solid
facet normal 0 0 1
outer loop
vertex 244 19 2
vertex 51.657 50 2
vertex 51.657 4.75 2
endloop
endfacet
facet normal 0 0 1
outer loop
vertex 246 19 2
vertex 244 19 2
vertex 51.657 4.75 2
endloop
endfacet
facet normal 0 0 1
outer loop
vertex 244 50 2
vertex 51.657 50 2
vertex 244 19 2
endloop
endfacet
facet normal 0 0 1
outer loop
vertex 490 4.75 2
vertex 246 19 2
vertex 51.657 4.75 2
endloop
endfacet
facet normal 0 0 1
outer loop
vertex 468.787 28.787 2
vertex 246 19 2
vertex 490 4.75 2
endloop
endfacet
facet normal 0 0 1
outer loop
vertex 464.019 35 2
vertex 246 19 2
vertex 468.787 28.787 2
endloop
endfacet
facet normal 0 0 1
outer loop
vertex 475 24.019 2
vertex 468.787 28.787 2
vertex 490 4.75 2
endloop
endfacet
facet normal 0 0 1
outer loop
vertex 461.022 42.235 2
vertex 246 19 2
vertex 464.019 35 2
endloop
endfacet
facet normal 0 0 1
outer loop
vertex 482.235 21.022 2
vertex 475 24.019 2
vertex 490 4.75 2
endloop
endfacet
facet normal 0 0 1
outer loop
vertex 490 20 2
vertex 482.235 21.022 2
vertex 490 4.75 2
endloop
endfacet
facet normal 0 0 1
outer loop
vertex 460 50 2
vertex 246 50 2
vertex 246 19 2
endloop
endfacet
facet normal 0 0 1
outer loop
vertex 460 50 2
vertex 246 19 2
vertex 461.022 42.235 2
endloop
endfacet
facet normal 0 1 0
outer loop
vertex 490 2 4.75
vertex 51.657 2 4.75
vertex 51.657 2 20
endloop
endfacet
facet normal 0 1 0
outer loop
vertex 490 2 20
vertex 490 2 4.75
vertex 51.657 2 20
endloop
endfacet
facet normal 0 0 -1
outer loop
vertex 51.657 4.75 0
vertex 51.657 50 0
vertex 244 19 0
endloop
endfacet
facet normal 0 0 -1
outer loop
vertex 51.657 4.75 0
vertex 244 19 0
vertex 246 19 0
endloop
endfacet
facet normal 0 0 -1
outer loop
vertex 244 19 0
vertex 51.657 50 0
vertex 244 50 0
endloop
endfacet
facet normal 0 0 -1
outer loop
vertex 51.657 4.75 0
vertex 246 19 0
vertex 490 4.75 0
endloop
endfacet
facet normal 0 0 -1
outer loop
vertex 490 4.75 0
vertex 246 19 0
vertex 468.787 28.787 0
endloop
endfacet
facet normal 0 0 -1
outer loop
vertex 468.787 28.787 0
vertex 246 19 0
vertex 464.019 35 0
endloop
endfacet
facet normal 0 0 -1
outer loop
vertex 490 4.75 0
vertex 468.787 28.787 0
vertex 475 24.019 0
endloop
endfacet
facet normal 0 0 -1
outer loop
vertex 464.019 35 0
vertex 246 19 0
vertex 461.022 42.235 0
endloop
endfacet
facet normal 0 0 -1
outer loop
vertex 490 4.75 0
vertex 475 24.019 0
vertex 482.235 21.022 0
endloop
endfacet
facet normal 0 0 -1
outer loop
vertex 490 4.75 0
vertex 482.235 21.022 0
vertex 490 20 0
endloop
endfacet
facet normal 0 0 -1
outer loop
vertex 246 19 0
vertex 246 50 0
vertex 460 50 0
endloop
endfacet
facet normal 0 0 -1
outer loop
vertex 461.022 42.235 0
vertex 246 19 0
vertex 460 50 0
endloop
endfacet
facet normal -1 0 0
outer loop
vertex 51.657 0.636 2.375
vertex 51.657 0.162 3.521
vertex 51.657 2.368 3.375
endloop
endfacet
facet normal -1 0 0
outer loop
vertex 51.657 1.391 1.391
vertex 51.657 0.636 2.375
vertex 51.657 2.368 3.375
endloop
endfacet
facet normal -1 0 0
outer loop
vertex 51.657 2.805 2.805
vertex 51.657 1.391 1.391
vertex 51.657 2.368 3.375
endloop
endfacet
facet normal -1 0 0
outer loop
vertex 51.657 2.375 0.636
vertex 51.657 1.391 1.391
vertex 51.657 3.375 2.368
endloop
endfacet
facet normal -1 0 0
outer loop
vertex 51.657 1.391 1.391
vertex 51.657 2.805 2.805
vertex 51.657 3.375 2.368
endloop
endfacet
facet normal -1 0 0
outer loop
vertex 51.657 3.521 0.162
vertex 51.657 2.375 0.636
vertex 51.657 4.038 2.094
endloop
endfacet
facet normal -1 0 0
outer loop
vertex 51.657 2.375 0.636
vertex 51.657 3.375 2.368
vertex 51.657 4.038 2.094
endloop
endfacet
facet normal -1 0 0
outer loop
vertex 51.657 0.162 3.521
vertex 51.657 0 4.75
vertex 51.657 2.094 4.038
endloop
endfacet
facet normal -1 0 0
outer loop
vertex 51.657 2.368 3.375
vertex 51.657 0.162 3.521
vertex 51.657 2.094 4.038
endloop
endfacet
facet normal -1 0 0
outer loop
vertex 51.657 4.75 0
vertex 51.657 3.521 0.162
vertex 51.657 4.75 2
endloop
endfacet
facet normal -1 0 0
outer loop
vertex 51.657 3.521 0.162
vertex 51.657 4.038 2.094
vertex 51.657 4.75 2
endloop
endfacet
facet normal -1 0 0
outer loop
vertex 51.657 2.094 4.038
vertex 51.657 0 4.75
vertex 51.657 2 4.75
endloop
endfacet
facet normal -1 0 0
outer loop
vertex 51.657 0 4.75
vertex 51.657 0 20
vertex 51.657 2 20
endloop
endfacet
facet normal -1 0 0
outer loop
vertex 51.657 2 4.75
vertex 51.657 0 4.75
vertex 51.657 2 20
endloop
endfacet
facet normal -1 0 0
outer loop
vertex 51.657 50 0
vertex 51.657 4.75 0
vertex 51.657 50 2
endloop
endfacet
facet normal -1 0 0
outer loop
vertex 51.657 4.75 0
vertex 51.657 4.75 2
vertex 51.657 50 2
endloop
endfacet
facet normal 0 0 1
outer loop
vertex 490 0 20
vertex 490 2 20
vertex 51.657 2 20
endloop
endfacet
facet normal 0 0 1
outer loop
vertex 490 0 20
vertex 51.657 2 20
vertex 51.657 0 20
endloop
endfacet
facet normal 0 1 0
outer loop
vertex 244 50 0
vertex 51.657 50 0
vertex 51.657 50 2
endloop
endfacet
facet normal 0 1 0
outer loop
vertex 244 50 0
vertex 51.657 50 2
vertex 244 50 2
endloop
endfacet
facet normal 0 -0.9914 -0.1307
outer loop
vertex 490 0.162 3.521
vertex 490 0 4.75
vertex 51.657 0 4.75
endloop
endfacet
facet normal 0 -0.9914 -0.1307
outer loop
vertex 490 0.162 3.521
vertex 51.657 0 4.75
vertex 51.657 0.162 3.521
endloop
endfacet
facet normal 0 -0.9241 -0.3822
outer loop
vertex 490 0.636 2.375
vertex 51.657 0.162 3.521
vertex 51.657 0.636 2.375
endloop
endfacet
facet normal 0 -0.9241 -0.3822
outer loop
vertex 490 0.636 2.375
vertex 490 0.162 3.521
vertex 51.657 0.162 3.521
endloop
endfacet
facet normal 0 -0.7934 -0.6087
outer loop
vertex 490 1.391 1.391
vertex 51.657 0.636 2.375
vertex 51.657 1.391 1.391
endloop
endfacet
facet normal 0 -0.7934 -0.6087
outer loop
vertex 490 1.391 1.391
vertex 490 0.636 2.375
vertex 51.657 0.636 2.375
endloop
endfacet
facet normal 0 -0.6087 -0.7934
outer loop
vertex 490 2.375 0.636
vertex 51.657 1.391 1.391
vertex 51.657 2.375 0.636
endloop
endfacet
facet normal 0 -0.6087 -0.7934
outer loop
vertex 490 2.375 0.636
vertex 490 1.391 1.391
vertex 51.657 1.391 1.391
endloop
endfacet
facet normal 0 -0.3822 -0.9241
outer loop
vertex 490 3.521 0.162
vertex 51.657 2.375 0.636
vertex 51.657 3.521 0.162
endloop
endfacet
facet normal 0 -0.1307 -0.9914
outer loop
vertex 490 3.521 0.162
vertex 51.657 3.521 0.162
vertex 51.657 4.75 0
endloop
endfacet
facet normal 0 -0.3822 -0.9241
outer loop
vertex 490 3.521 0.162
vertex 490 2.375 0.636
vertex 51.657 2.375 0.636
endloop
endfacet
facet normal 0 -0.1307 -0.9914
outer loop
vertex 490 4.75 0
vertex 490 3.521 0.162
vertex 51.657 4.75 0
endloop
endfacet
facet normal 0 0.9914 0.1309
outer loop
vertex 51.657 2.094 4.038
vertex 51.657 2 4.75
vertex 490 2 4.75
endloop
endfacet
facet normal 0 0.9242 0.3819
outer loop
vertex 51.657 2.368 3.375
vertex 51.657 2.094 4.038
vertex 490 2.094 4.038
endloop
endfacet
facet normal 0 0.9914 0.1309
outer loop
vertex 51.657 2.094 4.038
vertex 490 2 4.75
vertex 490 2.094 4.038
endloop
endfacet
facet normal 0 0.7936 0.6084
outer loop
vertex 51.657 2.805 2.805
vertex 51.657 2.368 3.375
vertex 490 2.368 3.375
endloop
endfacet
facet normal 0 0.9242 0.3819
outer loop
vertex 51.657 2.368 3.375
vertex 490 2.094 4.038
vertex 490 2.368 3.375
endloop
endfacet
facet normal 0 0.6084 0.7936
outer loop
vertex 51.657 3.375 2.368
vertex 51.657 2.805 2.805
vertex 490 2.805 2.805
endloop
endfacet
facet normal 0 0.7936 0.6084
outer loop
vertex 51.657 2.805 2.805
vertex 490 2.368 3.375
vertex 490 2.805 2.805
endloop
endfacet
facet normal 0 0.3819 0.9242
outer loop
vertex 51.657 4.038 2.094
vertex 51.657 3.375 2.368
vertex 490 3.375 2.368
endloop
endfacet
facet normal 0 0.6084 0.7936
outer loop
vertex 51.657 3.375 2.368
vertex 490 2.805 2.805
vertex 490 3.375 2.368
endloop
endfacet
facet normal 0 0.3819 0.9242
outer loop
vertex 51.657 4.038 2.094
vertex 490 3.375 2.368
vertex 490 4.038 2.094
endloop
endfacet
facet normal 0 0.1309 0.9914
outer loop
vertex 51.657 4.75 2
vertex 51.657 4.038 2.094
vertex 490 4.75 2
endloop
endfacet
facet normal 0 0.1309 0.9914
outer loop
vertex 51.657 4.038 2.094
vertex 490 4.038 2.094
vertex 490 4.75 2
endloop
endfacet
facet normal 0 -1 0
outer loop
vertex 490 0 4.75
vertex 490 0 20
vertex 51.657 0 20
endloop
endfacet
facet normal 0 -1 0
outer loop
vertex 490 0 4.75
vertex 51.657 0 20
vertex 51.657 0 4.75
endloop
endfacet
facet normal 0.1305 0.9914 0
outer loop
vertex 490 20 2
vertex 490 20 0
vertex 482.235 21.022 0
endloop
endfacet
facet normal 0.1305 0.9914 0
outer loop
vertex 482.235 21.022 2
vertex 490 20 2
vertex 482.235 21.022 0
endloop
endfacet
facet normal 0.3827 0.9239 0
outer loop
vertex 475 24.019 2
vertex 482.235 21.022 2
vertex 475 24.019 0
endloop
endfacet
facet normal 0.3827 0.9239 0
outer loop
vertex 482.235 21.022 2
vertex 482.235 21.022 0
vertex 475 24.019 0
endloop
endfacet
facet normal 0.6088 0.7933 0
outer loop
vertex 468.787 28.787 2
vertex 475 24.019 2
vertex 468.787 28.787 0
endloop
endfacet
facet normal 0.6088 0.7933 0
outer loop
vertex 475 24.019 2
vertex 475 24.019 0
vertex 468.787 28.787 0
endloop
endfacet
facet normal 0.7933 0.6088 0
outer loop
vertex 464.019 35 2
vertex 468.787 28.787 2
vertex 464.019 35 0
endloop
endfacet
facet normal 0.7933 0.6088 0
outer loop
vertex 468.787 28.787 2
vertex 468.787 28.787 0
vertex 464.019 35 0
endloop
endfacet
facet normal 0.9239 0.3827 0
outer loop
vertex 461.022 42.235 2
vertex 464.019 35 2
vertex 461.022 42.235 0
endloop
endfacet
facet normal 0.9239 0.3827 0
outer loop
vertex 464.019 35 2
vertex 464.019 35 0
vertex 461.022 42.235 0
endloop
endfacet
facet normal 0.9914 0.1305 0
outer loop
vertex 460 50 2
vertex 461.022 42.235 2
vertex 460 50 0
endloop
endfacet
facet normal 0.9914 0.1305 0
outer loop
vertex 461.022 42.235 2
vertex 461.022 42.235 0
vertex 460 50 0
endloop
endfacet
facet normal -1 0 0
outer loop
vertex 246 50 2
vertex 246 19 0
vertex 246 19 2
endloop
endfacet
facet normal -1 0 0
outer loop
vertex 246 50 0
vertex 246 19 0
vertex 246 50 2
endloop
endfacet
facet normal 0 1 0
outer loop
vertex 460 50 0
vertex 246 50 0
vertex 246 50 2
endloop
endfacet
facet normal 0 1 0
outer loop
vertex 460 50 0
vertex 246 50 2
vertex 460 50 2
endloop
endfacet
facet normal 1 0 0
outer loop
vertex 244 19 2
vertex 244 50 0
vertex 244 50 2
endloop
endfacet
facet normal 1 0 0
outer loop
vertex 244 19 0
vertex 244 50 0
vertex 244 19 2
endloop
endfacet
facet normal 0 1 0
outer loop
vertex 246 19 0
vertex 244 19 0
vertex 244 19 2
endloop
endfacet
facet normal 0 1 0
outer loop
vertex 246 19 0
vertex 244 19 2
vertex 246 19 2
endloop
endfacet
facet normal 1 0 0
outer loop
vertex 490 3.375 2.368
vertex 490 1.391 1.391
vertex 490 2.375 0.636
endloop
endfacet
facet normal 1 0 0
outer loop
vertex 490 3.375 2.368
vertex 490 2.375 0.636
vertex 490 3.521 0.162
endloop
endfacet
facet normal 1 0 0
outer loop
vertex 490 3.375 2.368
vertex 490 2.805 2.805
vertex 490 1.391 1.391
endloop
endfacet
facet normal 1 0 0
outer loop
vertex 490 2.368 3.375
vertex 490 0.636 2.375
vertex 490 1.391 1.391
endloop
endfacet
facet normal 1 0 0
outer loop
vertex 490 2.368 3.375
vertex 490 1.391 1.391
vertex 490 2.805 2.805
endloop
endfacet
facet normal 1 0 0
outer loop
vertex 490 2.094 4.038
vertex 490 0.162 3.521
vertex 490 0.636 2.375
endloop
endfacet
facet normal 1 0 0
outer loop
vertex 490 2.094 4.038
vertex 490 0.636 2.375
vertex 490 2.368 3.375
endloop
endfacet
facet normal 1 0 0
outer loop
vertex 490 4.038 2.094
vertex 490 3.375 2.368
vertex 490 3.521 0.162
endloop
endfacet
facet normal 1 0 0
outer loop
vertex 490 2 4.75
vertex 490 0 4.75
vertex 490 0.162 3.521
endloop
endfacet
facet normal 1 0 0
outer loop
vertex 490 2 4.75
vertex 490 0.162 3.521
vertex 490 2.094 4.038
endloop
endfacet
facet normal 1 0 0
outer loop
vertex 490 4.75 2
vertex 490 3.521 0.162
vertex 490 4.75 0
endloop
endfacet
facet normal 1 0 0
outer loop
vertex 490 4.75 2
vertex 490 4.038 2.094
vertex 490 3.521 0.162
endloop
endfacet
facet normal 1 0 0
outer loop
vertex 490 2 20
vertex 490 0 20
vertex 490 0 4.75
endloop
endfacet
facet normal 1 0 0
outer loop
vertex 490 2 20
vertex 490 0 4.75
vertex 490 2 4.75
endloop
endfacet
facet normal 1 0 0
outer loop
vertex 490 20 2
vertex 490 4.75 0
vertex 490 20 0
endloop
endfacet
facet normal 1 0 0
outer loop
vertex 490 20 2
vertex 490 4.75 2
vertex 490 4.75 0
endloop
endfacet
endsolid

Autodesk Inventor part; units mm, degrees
ref_plane "YZ Plane" through (0, 0, 0) normal (1, 0, 0) x (0, 1, 0)
ref_plane "XZ Plane" through (0, 0, 0) normal (0, 1, 0) x (-1, 0, 0)
ref_plane "XY Plane" through (0, 0, 0) normal (0, 0, 1) x (1, 0, 0)
sketch "Sketch1" plane through (0, 0, 0) normal (0, 0, 1) x (1, 0, 0)
  line L0 (-490, 50) -> (490, 50)
  line L1 (490, 50) -> (490, 0)
  line L2 (490, 0) -> (-490, 0)
  line L3 (-490, 0) -> (-490, 50)
  point P0 (0, 0)
  point P1 (0, 0)
  dimension "d0" = 980
  dimension "d1" = 50
extrude "Plate1" add sketch "Sketch1" along normal blind 2
sketch "Sketch2" plane through (490, 2, 0) normal (0, -1, 0) x (1, 0, 0)
  line L0 (-980, 0) -> (0, 0)
  line L1 (0, 0) -> (0, 20)
  line L2 (0, 20) -> (-980, 20)
  line L3 (-980, 20) -> (-980, 0)
edge flange "Flange1" height 20 angle 90 thickness 2 bend radius 2.75 thickness toward (0, -1, 0) relief tear relief width 2 relief depth 1 edges at (0, 0, 2) wall of the first edge with corners at (-490, 2, 0) (490, 2, 0) (490, 2, 20) (-490, 2, 20)
bend "Bend1"
corner "Corner1"
sketch "Sketch5" plane through (0, 0, 0) normal (0, 0, -1) x (-1, 0, 0)
  line L0 (490, 50) -> (-490, 50) projected
  line L1 (490, 0) -> (-490, 0) projected
  circle A0 centre (0, 50) radius 30
  line L2 (-490, 0) -> (-490, 50)
  line L3 (490, 0) -> (490, 50)
  circle A1 centre (-490, 50) radius 30
  circle A2 centre (490, 50) radius 30
  line L4 (-246, 50) -> (-244, 50)
  line L5 (-244, 50) -> (-244, 19)
  line L6 (-244, 19) -> (-246, 19)
  line L7 (-246, 19) -> (-246, 50)
  line L8 (244, 50) -> (246, 50)
  line L9 (246, 50) -> (246, 19)
  line L10 (246, 19) -> (244, 19)
  line L11 (244, 19) -> (244, 50)
  line L12 (0, 50) -> (0, 0) construction
  point P0 (245, 19)
  point P1 (-245, 19)
  point P2 (-490, 20)
  point P3 (-460, 50)
  point P4 (-30, 50)
  point P5 (30, 50)
  point P6 (460, 50)
  point P7 (490, 20)
  point P8 (-244, 50)
  point P9 (246, 50)
  dimension "d33" = 60
  dimension "d34" = 2
  dimension "d35" = 31
  dimension "d36" = 490
extrude "Extrusion1" cut sketch "Sketch5" against normal through all contours L9 L10 L11 L0 | L0 L3 A2 | A0 L0 | L5 L6 L7 L0 | L2 L0 A1 picked at (470.2507, 47.7748) picked at (6.5355, 34.7298) picked at (-470.2507, 47.7748)
sketch "Sketch7" plane through (0, 0, 2) normal (0, 0, 1) x (1, 0, 0)
  line L0 (468.7934, 20.88) -> (468.7934, 8.88) construction
  line L1 (468.7934, 8.88) -> (280.354, 8.88) construction
  line L2 (280.354, 8.88) -> (280.354, 20.88) construction
  line L3 (280.354, 20.88) -> (468.7934, 20.88) construction
  line L4 (-244, 50) -> (-30, 50) projected
  point P0 (0, 0)
  point P1 (-1, 50)
  point P2 (1, 50)
  dimension "d30" = 12
mark "Mark1"
sketch "Sketch8" plane through (0, 0, 0) normal (0, 0, -1) x (-1, 0, 0)
  line L0 (-244, 50) -> (-51.6572, 50)
  line L1 (-51.6572, 50) -> (502.6857, 50)
  line L2 (502.6857, 50) -> (502.6857, -31.7842)
  line L3 (502.6857, -31.7842) -> (-51.6572, -31.7842)
  line L4 (-51.6572, -31.7842) -> (-51.6572, 50)
  point P0 (0, 0)
extrude "Extrusion3" cut sketch "Sketch8" along normal through all both and the other way through all
equation "\"d1\" = Стрингер_7"
equation "\"d2\" = Thickness"
equation "\"d3\" = BendReliefWidth"
equation "\"d4\" = BendReliefDepth"
equation "\"d5\" = MinimumRemnant"
equation "\"d6\" = TransitionRadius"
equation "\"d9\" = BendRadius"
equation "\"d10\" = CornerReliefSize"
equation "\"d11\" = GapSize"
equation "\"d12\" = JacobiRadiusSize"
equation "\"BendReliefWidth\" = Thickness"
equation "\"BendReliefDepth\" = 0.5 * Thickness"
equation "\"CornerReliefSize\" = 4 * Thickness"
equation "\"MinimumRemnant\" = 2 * Thickness"
equation "\"TransitionRadius\" = BendRadius"
equation "\"JacobiRadiusSize\" = BendRadius"
equation "\"GapSize\" = Thickness"
equation "\"Стрингер_7\" = 50"
equation "\"Thickness\" = 2"
equation "\"BendRadius\" = 2.75"
properties part number "MSC 506 !!GNUT' ZERKAL'NO!!" material "Stainless Steel"
